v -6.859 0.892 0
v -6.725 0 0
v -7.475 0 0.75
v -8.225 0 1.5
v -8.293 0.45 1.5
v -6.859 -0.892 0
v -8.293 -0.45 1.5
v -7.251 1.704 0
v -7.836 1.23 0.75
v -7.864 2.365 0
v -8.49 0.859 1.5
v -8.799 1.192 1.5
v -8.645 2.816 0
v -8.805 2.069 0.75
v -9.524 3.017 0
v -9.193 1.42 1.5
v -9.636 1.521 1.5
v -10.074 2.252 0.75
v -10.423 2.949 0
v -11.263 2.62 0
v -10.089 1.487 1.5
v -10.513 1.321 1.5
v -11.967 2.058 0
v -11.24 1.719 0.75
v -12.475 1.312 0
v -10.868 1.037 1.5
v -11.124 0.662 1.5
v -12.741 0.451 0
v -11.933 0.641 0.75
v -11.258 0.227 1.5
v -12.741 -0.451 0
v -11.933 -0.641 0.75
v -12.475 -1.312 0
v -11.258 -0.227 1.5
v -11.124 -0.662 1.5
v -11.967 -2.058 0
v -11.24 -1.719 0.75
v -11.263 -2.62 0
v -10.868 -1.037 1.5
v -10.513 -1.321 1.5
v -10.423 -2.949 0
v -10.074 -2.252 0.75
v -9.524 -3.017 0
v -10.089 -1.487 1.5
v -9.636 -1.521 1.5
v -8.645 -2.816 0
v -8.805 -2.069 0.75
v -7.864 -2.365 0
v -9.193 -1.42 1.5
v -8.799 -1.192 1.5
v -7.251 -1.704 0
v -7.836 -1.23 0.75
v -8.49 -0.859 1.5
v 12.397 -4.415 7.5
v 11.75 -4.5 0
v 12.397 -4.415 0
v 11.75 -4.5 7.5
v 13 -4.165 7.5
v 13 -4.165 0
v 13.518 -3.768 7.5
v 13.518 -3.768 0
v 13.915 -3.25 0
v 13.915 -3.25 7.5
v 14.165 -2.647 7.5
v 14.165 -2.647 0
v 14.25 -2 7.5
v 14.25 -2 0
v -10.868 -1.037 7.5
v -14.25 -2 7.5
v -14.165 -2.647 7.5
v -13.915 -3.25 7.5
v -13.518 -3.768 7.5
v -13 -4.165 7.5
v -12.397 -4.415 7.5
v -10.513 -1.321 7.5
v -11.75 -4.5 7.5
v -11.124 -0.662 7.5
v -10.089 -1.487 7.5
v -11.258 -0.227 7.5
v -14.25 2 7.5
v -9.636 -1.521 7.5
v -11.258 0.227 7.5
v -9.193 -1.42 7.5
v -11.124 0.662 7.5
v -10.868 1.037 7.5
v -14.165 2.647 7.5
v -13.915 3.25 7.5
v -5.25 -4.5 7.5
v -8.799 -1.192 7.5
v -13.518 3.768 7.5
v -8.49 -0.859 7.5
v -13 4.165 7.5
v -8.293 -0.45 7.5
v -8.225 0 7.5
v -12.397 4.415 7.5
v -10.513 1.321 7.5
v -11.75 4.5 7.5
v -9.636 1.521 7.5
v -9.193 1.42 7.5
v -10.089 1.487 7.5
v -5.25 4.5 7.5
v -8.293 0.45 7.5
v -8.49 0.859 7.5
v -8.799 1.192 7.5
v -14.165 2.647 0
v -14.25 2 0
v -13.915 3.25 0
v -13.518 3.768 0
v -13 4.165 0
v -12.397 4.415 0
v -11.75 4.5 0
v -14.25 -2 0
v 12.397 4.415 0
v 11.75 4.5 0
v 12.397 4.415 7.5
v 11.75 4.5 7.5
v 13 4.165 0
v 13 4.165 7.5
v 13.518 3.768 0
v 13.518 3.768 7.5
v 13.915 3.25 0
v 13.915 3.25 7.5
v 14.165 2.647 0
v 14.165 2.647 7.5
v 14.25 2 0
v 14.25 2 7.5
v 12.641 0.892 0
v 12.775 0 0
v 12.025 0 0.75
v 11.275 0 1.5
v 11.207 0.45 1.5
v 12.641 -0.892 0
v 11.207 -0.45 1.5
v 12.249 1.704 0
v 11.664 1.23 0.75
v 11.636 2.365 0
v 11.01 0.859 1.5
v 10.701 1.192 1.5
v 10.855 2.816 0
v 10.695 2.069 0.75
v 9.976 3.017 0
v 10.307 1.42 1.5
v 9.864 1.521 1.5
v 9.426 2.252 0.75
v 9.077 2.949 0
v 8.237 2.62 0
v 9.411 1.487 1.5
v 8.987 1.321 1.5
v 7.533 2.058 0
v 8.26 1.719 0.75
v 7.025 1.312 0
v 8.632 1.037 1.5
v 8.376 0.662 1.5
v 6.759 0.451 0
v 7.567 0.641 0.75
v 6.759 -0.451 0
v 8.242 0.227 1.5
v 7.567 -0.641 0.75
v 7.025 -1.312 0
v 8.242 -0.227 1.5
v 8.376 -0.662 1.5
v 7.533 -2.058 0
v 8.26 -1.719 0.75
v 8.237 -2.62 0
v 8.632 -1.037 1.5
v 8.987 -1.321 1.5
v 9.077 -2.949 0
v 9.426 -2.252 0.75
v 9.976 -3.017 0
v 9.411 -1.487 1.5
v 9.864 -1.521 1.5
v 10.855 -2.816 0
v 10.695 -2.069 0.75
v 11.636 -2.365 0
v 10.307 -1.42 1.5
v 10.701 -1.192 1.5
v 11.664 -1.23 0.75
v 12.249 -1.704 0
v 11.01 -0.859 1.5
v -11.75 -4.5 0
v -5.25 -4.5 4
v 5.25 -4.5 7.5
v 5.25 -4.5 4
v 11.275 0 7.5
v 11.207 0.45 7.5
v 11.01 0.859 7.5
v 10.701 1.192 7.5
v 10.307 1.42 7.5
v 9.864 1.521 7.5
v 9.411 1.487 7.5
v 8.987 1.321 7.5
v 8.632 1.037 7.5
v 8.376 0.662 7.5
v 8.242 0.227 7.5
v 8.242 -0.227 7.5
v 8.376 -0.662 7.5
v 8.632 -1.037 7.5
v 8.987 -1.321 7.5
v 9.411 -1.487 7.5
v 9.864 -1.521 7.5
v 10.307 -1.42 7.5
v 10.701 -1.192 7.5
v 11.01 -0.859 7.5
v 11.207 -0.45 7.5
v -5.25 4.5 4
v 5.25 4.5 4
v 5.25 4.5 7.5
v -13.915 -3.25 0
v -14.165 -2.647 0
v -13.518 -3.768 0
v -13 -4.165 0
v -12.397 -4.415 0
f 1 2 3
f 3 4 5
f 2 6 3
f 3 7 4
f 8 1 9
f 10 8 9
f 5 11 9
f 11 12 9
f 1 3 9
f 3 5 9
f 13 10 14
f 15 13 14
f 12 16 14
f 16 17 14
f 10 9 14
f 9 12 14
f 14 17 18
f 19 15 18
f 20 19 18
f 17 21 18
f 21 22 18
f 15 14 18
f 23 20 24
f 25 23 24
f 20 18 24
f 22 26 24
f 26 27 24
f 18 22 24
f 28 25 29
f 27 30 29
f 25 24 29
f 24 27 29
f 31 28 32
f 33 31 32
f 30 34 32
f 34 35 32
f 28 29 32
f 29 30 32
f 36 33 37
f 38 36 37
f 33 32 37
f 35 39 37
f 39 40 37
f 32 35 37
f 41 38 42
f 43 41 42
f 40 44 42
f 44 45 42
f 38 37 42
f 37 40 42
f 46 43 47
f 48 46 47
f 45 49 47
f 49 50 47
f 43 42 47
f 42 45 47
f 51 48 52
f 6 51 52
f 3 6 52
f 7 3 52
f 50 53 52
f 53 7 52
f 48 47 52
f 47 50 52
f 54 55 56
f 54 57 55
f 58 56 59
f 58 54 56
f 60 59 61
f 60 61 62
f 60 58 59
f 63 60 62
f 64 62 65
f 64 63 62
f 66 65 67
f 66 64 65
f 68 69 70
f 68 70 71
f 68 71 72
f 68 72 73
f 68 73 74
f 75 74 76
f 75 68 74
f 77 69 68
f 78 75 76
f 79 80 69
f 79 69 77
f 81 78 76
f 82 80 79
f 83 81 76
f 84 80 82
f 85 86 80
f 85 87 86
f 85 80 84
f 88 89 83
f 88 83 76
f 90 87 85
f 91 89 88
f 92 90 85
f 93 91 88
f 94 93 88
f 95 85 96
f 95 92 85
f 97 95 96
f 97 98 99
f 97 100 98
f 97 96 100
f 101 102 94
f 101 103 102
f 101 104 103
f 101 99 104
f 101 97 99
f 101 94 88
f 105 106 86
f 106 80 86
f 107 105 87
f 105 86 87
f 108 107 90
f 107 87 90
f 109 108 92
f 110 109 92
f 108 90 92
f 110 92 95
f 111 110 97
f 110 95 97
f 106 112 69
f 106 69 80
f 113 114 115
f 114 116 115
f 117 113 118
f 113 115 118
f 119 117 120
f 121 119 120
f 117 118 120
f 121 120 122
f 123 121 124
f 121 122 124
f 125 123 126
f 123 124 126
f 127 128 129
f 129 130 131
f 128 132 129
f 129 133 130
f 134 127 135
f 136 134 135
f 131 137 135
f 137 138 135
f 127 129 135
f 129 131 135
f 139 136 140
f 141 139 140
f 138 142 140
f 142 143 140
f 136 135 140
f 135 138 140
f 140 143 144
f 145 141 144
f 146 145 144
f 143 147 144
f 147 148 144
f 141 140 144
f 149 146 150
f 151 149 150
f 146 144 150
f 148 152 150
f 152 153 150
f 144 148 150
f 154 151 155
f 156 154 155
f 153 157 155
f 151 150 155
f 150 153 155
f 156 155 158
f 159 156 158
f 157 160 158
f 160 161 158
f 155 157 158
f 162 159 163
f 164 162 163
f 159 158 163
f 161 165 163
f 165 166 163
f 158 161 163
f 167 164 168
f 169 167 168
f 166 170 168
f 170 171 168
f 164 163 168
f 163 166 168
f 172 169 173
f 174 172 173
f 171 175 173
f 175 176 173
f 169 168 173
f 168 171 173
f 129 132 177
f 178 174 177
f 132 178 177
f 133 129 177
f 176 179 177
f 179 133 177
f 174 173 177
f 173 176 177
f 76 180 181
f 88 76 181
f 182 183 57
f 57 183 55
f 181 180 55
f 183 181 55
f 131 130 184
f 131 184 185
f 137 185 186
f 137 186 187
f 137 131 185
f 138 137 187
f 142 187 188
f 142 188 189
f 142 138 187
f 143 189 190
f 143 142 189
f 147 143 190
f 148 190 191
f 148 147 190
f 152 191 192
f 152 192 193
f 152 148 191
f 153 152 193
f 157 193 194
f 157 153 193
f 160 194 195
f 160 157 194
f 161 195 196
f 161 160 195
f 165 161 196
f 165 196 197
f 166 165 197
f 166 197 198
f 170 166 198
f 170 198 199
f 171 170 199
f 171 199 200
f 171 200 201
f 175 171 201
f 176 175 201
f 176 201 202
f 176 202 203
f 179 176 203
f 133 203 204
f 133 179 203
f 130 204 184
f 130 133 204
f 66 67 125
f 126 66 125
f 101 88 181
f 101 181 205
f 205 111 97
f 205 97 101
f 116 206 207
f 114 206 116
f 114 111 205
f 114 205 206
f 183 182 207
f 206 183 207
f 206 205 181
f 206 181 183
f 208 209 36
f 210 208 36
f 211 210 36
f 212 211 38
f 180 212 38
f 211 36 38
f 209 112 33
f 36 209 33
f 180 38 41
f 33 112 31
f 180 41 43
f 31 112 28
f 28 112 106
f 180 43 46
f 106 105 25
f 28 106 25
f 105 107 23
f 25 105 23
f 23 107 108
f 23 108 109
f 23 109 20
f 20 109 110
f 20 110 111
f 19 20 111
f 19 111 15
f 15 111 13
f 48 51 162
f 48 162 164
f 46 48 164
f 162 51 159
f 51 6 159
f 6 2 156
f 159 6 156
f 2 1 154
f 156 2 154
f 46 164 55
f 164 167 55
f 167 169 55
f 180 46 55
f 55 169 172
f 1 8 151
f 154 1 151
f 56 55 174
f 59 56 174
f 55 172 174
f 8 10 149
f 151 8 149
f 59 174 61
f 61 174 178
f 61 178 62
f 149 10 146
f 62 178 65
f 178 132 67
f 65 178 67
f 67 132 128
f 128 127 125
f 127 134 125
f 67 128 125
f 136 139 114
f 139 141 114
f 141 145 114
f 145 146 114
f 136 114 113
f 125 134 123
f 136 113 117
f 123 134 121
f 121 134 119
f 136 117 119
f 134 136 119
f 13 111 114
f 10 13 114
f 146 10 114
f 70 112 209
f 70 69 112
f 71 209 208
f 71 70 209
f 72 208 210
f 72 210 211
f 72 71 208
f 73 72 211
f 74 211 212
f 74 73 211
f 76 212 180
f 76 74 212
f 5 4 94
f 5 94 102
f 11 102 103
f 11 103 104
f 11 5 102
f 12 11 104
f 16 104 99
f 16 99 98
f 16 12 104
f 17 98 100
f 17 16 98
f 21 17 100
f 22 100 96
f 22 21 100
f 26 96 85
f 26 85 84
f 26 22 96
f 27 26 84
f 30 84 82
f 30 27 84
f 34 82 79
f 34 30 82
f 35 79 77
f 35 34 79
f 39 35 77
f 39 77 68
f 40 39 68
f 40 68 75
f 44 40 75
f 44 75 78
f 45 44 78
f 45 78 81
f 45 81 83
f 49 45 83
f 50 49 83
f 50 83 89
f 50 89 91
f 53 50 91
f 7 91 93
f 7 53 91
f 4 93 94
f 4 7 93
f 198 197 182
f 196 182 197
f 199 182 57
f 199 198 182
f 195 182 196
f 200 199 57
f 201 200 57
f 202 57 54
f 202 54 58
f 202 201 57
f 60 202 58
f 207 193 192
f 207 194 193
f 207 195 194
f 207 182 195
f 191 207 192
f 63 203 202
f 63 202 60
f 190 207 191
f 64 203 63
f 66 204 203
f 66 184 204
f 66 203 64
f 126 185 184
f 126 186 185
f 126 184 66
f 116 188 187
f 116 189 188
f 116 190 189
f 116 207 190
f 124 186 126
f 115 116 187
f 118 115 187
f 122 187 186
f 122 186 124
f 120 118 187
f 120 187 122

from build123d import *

# Parameters (mm, degrees)
F0_W     = 28.5
F0_H     = 9
F0_R     = 1.525
F1_DEPTH = 7.5
F2_W     = 10.5
F2_H     = 9
F3_DEPTH = 3.5
F4_R     = 2.5
F5_SIZE2 = 1.5
F5_SIZE  = 1.5


with BuildPart() as f1:
    # F0 (on Top) → F1 (new body)
    with BuildSketch(Plane.XY):
        Rectangle(F0_W, F0_H)
        with Locations((-9.75, 0)):
            Circle(F0_R, mode=Mode.SUBTRACT)
        with Locations((9.75, 0)):
            Circle(F0_R, mode=Mode.SUBTRACT)
    extrude(amount=F1_DEPTH)

    # F2 (on face) → F3 (cut)
    with BuildSketch(Plane.XY.offset(7.5)):
        Rectangle(F2_W, F2_H)
    extrude(amount=-F3_DEPTH, mode=Mode.SUBTRACT)

    # F4
    f4_edges = [f1.edges().sort_by_distance(p)[0] for p in [
        (14.25, -4.5, 3.75),
        (14.25, 4.5, 3.75),
        (-14.25, -4.5, 3.75),
        (-14.25, 4.5, 3.75),
    ]]
    fillet(f4_edges, radius=F4_R)

    # F5
    f5_edges = [f1.edges().sort_by_distance(p)[0] for p in [
        (-11.275, 0, 0),
        (8.225, 0, 0),
    ]]
    chamfer(f5_edges, length=F5_SIZE, length2=F5_SIZE2)


solid = f1.part
